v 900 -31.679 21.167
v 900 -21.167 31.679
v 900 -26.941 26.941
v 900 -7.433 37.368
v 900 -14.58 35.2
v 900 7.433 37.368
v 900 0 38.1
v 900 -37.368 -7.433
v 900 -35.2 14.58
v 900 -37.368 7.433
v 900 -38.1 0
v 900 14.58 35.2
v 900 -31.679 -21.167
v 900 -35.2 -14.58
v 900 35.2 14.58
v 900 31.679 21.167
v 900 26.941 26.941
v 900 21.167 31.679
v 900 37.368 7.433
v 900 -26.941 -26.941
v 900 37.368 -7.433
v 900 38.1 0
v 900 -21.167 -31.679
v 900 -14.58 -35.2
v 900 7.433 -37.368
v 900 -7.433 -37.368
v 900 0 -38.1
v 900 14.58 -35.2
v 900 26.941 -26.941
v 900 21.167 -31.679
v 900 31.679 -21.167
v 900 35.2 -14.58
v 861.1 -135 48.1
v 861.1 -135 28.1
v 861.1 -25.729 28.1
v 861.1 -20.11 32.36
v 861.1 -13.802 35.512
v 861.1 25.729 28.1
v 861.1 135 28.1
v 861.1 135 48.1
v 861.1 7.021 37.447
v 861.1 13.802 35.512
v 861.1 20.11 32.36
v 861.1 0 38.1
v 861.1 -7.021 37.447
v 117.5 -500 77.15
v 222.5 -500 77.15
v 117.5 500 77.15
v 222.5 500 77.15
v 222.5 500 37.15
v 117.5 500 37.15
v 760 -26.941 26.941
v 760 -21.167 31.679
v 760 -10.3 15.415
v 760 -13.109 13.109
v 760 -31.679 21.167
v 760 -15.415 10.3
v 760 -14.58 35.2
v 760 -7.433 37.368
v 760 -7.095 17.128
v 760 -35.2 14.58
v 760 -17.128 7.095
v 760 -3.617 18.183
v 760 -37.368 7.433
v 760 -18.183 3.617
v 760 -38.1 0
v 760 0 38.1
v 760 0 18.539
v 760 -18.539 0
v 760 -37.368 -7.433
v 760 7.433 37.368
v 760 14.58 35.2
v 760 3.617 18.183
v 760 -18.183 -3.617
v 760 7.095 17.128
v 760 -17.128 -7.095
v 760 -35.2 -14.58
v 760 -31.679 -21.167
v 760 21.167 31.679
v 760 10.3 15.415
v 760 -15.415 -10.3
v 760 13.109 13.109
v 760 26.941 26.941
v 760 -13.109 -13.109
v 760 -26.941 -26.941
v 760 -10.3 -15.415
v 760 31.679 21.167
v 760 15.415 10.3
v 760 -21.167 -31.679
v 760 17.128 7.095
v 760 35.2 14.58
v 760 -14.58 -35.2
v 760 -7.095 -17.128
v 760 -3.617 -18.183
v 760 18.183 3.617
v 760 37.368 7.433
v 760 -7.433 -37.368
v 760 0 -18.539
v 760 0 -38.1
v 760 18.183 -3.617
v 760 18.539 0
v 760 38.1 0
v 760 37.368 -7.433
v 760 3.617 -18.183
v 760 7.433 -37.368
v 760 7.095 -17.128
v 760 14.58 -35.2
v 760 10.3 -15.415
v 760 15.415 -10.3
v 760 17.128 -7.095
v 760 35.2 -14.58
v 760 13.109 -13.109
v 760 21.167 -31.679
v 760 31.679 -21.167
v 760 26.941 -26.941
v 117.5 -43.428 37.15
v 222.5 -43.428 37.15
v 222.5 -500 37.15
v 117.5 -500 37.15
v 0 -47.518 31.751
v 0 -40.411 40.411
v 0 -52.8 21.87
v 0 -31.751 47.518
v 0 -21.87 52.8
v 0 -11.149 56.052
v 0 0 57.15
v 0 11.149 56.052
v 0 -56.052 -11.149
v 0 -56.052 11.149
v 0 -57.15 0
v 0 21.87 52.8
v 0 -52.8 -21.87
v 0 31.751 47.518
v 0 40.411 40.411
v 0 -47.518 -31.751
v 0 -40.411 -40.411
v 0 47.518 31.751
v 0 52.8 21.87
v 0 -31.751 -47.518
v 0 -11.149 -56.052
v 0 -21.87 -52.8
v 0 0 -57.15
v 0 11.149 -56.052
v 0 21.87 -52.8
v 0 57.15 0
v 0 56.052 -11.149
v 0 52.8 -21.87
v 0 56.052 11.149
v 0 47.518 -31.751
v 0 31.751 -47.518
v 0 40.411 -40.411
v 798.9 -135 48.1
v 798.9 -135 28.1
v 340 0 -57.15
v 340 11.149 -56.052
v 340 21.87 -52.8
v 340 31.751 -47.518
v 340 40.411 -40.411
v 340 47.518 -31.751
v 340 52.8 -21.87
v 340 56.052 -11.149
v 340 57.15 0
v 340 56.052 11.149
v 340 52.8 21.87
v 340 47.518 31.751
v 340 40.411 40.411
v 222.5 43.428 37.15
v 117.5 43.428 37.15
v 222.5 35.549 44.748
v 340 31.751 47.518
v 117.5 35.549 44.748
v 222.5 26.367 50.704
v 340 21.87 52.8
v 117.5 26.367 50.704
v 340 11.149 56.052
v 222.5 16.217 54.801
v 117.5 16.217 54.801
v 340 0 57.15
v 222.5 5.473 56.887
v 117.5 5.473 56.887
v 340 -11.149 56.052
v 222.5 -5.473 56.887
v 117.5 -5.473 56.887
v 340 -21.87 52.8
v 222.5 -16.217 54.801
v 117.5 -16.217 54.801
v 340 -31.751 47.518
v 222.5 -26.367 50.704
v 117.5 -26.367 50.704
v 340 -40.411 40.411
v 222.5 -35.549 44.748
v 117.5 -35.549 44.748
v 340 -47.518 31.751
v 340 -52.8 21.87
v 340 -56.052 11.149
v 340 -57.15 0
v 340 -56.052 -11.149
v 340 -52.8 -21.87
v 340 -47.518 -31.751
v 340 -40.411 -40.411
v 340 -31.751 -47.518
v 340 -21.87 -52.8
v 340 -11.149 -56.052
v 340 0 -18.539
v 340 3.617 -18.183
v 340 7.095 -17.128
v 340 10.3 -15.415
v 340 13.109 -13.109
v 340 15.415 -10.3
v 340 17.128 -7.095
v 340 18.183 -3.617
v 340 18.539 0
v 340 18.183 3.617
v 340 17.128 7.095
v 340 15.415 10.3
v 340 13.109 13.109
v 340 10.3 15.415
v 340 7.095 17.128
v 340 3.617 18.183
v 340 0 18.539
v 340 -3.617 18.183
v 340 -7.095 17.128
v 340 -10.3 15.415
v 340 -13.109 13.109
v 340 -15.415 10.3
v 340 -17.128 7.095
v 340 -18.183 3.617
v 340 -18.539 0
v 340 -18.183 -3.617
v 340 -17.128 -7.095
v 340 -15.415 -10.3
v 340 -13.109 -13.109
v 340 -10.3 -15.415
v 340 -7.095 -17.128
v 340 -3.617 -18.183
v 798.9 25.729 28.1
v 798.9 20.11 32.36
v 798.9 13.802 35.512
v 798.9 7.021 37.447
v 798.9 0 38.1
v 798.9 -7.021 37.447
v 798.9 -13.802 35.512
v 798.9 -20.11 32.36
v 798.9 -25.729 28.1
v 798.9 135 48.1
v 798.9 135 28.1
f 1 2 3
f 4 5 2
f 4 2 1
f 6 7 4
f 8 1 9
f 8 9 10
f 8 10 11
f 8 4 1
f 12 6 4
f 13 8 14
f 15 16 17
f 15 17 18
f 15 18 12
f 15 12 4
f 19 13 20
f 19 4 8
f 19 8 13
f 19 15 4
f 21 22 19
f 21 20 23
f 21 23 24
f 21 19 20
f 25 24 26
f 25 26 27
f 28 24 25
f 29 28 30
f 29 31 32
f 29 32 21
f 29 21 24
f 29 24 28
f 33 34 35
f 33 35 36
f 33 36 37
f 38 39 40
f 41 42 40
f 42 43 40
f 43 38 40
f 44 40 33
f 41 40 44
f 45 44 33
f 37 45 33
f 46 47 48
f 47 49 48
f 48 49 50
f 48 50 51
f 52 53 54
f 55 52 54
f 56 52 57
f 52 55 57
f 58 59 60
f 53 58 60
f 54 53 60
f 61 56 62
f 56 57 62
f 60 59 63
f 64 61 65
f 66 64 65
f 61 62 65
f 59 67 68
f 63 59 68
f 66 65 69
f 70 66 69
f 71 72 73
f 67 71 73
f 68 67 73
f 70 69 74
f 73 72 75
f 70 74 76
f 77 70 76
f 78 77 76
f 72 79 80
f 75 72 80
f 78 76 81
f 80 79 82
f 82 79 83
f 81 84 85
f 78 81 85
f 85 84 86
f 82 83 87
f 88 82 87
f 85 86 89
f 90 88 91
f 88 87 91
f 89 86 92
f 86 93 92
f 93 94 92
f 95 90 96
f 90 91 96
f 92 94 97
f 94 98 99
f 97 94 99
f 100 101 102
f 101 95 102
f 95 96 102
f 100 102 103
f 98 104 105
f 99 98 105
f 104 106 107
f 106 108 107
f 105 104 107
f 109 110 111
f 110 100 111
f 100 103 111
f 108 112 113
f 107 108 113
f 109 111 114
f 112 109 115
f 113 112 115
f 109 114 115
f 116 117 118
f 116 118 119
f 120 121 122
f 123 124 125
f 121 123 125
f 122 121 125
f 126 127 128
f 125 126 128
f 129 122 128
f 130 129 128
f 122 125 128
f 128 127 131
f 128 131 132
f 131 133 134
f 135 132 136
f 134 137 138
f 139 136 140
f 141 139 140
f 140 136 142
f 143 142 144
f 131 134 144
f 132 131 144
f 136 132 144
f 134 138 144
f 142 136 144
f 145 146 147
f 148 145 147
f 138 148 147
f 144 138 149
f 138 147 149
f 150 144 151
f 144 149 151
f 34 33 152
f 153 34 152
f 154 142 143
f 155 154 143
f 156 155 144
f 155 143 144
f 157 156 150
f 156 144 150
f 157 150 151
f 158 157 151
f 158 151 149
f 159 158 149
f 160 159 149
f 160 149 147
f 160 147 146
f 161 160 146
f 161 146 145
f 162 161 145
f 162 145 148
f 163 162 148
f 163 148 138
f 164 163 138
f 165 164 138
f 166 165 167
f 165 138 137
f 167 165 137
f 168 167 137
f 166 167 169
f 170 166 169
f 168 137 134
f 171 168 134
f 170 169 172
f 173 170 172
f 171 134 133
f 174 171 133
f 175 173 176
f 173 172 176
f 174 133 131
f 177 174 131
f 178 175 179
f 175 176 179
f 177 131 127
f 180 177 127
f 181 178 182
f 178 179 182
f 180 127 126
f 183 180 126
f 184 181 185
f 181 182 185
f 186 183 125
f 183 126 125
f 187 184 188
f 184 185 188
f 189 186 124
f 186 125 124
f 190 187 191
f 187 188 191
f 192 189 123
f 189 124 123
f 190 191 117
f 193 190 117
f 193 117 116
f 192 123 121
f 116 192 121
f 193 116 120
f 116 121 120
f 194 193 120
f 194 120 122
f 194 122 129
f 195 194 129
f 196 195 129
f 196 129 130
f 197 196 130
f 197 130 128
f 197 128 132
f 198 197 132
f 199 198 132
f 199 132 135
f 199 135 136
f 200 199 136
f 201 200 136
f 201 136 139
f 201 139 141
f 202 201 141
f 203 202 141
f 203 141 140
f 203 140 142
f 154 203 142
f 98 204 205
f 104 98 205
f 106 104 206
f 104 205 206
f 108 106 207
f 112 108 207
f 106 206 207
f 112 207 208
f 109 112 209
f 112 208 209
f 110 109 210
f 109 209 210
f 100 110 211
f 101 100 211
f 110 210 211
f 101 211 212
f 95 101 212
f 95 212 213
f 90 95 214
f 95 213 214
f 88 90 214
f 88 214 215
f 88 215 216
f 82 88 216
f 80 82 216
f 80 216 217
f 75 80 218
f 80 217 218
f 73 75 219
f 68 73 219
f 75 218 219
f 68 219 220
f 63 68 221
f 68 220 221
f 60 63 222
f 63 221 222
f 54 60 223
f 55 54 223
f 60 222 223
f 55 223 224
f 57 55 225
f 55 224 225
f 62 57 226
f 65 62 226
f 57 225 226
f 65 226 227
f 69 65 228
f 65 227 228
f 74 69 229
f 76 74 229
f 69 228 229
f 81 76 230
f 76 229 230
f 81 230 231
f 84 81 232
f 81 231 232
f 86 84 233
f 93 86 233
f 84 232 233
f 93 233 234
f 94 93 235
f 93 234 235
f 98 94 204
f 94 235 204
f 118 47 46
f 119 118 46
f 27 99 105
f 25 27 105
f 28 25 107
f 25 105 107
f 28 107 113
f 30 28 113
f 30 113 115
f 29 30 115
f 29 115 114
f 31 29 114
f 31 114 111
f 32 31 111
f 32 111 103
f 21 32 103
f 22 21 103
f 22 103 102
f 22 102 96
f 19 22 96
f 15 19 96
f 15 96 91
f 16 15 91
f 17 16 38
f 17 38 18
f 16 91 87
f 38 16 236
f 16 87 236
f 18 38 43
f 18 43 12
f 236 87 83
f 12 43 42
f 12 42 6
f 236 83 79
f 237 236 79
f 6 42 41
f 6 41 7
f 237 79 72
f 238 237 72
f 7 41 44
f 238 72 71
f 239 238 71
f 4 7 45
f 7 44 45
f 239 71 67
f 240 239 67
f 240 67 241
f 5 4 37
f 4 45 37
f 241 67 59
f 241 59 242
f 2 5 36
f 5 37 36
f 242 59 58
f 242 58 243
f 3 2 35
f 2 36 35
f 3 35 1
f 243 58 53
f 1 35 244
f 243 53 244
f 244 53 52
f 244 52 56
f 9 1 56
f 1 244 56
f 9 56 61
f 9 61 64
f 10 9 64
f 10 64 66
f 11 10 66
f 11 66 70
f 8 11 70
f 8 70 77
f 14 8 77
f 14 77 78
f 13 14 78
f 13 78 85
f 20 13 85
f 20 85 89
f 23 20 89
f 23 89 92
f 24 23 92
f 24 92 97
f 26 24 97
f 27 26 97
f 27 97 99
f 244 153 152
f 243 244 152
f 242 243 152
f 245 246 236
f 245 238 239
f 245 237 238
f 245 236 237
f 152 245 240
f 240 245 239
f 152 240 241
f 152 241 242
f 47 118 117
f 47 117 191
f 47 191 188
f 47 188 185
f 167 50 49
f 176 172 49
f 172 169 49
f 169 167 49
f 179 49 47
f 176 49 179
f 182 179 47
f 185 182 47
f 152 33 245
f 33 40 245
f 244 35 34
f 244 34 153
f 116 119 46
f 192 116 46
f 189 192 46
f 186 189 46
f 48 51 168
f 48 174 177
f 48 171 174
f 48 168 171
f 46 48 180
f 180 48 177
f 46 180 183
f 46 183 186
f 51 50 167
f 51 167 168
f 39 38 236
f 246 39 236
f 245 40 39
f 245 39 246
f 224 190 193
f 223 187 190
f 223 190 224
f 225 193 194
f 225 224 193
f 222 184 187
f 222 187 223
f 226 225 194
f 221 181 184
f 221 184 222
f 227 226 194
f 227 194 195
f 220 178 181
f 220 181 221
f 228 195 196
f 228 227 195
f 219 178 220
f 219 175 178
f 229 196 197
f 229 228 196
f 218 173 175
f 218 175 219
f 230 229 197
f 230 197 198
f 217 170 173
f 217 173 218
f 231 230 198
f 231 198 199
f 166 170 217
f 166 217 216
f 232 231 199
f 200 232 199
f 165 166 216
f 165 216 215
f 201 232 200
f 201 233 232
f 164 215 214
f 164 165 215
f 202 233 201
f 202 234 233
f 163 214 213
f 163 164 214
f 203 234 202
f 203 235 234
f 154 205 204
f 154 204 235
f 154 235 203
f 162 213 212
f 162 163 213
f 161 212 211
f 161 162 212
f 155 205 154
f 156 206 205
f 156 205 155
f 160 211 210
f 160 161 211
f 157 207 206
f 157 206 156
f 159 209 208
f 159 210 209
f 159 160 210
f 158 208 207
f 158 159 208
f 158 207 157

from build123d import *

# Parameters (mm, degrees)
SKETCH2_R           = 57.15
BOSS_EXTRUDE1_DEPTH = 340
SKETCH3_R           = 18.53927994
BOSS_EXTRUDE2_DEPTH = 420
SKETCH4_R           = 38.1
BOSS_EXTRUDE3_DEPTH = 140
SKETCH5_W           = 105
SKETCH5_H           = 40
BOSS_EXTRUDE4_DEPTH = 500
SKETCH6_W           = 62.2
SKETCH6_H           = 20
BOSS_EXTRUDE5_DEPTH = 135


with BuildPart() as part:
    # Sketch2 → Boss-Extrude1 (new body)
    with BuildSketch(Plane.YZ):
        with Locations(Location((0, 0, 0), (0, 0, 270))):
            Circle(SKETCH2_R)
    extrude(amount=BOSS_EXTRUDE1_DEPTH)

    # Sketch3 → Boss-Extrude2 (add)
    with BuildSketch(Plane.YZ.offset(340)):
        with Locations(Location((0, 0, 0), (0, 0, 270))):
            Circle(SKETCH3_R)
    extrude(amount=BOSS_EXTRUDE2_DEPTH)

    # Sketch4 → Boss-Extrude3 (add)
    with BuildSketch(Plane.YZ.offset(760)):
        with Locations(Location((0, 0, 0), (0, 0, 270))):
            Circle(SKETCH4_R)
    extrude(amount=BOSS_EXTRUDE3_DEPTH)

    # Sketch5 → Boss-Extrude4 (add, symmetric)
    with BuildSketch(Plane(origin=(0, 0, 0), x_dir=(-1, 0, 0), z_dir=(0, 1, 0))):
        with Locations((-170, 57.15)):
            Rectangle(SKETCH5_W, SKETCH5_H)
    extrude(amount=BOSS_EXTRUDE4_DEPTH, both=True)

    # Sketch6 → Boss-Extrude5 (add, symmetric)
    with BuildSketch(Plane(origin=(0, 0, 0), x_dir=(-1, 0, 0), z_dir=(0, 1, 0))):
        with Locations((-830, 38.1)):
            Rectangle(SKETCH6_W, SKETCH6_H)
    extrude(amount=BOSS_EXTRUDE5_DEPTH, both=True)


solid = part.part
